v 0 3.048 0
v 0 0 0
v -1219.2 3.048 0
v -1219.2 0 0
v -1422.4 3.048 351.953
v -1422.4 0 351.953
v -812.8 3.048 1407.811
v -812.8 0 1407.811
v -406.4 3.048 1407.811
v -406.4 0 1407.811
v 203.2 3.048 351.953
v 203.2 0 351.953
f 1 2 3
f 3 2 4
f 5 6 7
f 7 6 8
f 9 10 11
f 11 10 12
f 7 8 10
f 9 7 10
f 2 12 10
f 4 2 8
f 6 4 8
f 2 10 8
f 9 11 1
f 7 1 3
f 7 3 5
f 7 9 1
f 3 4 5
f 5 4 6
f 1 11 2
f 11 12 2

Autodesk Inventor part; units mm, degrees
ref_plane "YZ Plane" through (0, 0, 0) normal (1, 0, 0) x (0, 1, 0)
ref_plane "XZ Plane" through (0, 0, 0) normal (0, 1, 0) x (-1, 0, 0)
ref_plane "XY Plane" through (0, 0, 0) normal (0, 0, 1) x (1, 0, 0)
sketch "Sketch1" plane through (0, 0, 0) normal (0, 1, 0) x (-1, 0, 0)
  line L0 (0, 0) -> (1219.2, 0)
  line L1 (1219.2, 0) -> (1422.4, 351.9527)
  line L2 (1422.4, 351.9527) -> (812.8, 1407.8109)
  line L3 (812.8, 1407.8109) -> (406.4, 1407.8109)
  line L4 (406.4, 1407.8109) -> (-203.2, 351.9527)
  line L5 (-203.2, 351.9527) -> (0, 0)
  dimension "d7" = 1219.2
  dimension "d8" = 406.4
  dimension "d9" = 120
  dimension "d10" = 1219.2
  dimension "d11" = 120
  dimension "d12" = 406.4
  dimension "d13" = 1219.2
  dimension "d14" = 120
extrude "Plate1" add sketch "Sketch1" along normal blind 3.048
equation "\"BendRadius\" = Thickness"
equation "\"BendReliefWidth\" = Thickness"
equation "\"BendReliefDepth\" = 0.5 * Thickness"
equation "\"CornerReliefSize\" = 4 * Thickness"
equation "\"MinimumRemnant\" = 2 * Thickness"
equation "\"TransitionRadius\" = BendRadius"
equation "\"JacobiRadiusSize\" = BendRadius"
equation "\"GapSize\" = Thickness"
equation "\"d2\" = BendRadius"
equation "\"Thickness\" = 3.048"
properties part number "Ground" material "Carpet"
